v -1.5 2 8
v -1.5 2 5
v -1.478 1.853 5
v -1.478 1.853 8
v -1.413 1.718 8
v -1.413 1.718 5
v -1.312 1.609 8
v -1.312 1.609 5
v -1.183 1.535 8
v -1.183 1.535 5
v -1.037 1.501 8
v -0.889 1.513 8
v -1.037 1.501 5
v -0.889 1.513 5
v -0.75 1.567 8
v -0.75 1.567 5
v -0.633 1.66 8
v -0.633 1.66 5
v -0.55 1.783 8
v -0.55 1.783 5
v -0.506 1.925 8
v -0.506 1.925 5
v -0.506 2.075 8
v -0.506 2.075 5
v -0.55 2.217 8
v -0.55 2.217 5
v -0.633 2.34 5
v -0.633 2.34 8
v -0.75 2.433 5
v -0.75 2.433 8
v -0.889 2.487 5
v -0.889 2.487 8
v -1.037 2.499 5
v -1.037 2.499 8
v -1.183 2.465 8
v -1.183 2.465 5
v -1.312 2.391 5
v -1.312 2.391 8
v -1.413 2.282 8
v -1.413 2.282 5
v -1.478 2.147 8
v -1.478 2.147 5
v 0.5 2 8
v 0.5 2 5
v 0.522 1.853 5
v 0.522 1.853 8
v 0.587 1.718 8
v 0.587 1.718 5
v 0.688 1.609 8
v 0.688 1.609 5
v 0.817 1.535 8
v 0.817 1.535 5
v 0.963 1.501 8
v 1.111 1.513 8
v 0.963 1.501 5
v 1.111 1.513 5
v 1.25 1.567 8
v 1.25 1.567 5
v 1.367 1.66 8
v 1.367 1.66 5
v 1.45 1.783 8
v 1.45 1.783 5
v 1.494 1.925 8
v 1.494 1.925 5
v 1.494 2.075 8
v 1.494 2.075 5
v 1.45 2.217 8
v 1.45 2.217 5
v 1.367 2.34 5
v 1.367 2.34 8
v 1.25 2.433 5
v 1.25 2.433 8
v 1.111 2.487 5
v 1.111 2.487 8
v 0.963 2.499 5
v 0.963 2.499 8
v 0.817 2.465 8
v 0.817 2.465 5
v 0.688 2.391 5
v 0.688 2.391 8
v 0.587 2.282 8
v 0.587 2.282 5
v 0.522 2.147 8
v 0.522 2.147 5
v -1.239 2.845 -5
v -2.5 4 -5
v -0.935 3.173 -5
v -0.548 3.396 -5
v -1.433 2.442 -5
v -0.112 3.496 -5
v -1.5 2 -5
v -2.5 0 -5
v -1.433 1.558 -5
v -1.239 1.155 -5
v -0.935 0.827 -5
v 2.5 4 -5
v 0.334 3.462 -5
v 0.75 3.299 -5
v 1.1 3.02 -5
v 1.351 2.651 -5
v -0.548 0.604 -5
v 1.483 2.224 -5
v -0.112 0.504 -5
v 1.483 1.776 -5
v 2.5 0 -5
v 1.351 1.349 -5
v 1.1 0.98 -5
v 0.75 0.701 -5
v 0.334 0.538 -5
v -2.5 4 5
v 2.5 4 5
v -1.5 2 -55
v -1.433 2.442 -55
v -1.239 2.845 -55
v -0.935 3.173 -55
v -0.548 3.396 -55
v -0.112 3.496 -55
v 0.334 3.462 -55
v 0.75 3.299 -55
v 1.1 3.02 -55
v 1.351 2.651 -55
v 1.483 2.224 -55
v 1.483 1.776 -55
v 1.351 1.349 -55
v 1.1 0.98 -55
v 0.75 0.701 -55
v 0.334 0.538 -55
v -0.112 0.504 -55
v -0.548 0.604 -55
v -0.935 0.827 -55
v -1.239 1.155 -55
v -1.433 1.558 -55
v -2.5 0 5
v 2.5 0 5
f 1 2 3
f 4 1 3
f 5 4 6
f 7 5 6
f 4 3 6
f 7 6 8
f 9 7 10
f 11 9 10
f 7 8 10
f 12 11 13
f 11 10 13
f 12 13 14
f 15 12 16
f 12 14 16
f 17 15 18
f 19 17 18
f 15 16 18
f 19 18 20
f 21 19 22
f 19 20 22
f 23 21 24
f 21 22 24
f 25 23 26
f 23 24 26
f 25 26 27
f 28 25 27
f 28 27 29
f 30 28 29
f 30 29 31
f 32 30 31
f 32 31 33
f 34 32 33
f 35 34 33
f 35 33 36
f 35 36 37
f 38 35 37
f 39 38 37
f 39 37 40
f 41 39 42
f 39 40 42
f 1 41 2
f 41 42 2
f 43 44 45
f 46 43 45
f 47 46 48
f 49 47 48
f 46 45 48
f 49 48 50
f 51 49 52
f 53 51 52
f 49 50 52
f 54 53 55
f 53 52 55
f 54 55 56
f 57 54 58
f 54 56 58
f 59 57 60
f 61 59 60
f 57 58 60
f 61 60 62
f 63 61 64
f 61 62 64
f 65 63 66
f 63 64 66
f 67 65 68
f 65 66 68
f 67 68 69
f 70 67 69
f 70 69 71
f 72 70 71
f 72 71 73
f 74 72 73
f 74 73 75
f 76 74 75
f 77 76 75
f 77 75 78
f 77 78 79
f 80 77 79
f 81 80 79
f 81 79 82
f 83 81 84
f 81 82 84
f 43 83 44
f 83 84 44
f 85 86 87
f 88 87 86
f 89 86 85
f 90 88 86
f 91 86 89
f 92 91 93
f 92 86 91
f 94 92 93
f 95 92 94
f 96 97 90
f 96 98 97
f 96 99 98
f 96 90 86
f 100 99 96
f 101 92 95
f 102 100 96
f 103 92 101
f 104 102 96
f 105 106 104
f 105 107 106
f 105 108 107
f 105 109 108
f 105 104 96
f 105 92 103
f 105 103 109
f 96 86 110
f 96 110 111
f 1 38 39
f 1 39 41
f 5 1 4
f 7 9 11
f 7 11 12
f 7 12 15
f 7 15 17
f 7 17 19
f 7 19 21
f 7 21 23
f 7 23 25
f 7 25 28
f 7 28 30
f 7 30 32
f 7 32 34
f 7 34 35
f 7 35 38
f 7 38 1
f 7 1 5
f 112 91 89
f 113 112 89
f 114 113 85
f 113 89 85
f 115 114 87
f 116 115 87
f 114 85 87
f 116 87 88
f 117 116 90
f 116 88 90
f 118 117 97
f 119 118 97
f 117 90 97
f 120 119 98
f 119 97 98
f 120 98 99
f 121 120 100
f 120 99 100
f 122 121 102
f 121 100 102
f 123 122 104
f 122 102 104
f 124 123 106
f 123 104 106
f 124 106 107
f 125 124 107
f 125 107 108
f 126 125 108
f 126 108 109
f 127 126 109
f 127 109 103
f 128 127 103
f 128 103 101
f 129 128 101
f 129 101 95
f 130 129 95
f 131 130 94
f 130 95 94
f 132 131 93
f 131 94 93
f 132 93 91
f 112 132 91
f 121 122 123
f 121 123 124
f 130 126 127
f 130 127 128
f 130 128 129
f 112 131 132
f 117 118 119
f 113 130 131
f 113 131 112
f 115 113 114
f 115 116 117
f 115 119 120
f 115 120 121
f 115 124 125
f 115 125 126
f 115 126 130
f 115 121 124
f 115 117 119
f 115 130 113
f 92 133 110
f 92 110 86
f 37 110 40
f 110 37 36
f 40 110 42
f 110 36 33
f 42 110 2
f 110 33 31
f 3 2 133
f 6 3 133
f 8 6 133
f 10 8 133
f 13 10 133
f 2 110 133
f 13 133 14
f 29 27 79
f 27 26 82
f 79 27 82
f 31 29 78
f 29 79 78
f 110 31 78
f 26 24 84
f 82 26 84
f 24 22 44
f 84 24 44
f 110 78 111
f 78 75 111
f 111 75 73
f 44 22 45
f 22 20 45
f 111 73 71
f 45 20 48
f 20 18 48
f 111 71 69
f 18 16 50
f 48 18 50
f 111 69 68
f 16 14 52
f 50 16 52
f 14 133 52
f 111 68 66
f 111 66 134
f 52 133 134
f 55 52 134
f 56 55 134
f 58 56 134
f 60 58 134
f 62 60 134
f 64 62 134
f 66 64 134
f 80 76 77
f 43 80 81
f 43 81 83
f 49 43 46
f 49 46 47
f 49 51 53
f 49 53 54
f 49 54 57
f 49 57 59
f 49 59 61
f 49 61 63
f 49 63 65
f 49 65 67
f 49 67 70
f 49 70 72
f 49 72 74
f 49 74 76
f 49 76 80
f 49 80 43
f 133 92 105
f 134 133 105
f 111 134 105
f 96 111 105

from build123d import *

# Parameters (mm, degrees)
SKETCH2_W           = 5
SKETCH2_H           = 10
BOSS_EXTRUDE1_DEPTH = 4
SKETCH4_R           = 0.5
BOSS_EXTRUDE2_DEPTH = 3
SKETCH5_R           = 1.5
BOSS_EXTRUDE3_DEPTH = 50


with BuildPart() as part:
    # Sketch2 → Boss-Extrude1 (new body)
    with BuildSketch(Plane(origin=(0, 0, 0), x_dir=(1, 0, 0), z_dir=(0, 1, 0))):
        Rectangle(SKETCH2_W, SKETCH2_H)
    extrude(amount=BOSS_EXTRUDE1_DEPTH)

    # Sketch4 → Boss-Extrude2 (add)
    with BuildSketch(Plane.XY.offset(5)):
        with Locations(Location((-1, 2, 0), (0, 0, 180))):
            Circle(SKETCH4_R)
        with Locations(Location((1, 2, 0), (0, 0, 180))):
            Circle(SKETCH4_R)
    extrude(amount=BOSS_EXTRUDE2_DEPTH)

    # Sketch5 → Boss-Extrude3 (add)
    with BuildSketch(Plane(origin=(0, 0, -5), x_dir=(-1, 0, 0), z_dir=(0, 0, -1))):
        with Locations((0, 2)):
            Circle(SKETCH5_R)
    extrude(amount=BOSS_EXTRUDE3_DEPTH)


solid = part.part
